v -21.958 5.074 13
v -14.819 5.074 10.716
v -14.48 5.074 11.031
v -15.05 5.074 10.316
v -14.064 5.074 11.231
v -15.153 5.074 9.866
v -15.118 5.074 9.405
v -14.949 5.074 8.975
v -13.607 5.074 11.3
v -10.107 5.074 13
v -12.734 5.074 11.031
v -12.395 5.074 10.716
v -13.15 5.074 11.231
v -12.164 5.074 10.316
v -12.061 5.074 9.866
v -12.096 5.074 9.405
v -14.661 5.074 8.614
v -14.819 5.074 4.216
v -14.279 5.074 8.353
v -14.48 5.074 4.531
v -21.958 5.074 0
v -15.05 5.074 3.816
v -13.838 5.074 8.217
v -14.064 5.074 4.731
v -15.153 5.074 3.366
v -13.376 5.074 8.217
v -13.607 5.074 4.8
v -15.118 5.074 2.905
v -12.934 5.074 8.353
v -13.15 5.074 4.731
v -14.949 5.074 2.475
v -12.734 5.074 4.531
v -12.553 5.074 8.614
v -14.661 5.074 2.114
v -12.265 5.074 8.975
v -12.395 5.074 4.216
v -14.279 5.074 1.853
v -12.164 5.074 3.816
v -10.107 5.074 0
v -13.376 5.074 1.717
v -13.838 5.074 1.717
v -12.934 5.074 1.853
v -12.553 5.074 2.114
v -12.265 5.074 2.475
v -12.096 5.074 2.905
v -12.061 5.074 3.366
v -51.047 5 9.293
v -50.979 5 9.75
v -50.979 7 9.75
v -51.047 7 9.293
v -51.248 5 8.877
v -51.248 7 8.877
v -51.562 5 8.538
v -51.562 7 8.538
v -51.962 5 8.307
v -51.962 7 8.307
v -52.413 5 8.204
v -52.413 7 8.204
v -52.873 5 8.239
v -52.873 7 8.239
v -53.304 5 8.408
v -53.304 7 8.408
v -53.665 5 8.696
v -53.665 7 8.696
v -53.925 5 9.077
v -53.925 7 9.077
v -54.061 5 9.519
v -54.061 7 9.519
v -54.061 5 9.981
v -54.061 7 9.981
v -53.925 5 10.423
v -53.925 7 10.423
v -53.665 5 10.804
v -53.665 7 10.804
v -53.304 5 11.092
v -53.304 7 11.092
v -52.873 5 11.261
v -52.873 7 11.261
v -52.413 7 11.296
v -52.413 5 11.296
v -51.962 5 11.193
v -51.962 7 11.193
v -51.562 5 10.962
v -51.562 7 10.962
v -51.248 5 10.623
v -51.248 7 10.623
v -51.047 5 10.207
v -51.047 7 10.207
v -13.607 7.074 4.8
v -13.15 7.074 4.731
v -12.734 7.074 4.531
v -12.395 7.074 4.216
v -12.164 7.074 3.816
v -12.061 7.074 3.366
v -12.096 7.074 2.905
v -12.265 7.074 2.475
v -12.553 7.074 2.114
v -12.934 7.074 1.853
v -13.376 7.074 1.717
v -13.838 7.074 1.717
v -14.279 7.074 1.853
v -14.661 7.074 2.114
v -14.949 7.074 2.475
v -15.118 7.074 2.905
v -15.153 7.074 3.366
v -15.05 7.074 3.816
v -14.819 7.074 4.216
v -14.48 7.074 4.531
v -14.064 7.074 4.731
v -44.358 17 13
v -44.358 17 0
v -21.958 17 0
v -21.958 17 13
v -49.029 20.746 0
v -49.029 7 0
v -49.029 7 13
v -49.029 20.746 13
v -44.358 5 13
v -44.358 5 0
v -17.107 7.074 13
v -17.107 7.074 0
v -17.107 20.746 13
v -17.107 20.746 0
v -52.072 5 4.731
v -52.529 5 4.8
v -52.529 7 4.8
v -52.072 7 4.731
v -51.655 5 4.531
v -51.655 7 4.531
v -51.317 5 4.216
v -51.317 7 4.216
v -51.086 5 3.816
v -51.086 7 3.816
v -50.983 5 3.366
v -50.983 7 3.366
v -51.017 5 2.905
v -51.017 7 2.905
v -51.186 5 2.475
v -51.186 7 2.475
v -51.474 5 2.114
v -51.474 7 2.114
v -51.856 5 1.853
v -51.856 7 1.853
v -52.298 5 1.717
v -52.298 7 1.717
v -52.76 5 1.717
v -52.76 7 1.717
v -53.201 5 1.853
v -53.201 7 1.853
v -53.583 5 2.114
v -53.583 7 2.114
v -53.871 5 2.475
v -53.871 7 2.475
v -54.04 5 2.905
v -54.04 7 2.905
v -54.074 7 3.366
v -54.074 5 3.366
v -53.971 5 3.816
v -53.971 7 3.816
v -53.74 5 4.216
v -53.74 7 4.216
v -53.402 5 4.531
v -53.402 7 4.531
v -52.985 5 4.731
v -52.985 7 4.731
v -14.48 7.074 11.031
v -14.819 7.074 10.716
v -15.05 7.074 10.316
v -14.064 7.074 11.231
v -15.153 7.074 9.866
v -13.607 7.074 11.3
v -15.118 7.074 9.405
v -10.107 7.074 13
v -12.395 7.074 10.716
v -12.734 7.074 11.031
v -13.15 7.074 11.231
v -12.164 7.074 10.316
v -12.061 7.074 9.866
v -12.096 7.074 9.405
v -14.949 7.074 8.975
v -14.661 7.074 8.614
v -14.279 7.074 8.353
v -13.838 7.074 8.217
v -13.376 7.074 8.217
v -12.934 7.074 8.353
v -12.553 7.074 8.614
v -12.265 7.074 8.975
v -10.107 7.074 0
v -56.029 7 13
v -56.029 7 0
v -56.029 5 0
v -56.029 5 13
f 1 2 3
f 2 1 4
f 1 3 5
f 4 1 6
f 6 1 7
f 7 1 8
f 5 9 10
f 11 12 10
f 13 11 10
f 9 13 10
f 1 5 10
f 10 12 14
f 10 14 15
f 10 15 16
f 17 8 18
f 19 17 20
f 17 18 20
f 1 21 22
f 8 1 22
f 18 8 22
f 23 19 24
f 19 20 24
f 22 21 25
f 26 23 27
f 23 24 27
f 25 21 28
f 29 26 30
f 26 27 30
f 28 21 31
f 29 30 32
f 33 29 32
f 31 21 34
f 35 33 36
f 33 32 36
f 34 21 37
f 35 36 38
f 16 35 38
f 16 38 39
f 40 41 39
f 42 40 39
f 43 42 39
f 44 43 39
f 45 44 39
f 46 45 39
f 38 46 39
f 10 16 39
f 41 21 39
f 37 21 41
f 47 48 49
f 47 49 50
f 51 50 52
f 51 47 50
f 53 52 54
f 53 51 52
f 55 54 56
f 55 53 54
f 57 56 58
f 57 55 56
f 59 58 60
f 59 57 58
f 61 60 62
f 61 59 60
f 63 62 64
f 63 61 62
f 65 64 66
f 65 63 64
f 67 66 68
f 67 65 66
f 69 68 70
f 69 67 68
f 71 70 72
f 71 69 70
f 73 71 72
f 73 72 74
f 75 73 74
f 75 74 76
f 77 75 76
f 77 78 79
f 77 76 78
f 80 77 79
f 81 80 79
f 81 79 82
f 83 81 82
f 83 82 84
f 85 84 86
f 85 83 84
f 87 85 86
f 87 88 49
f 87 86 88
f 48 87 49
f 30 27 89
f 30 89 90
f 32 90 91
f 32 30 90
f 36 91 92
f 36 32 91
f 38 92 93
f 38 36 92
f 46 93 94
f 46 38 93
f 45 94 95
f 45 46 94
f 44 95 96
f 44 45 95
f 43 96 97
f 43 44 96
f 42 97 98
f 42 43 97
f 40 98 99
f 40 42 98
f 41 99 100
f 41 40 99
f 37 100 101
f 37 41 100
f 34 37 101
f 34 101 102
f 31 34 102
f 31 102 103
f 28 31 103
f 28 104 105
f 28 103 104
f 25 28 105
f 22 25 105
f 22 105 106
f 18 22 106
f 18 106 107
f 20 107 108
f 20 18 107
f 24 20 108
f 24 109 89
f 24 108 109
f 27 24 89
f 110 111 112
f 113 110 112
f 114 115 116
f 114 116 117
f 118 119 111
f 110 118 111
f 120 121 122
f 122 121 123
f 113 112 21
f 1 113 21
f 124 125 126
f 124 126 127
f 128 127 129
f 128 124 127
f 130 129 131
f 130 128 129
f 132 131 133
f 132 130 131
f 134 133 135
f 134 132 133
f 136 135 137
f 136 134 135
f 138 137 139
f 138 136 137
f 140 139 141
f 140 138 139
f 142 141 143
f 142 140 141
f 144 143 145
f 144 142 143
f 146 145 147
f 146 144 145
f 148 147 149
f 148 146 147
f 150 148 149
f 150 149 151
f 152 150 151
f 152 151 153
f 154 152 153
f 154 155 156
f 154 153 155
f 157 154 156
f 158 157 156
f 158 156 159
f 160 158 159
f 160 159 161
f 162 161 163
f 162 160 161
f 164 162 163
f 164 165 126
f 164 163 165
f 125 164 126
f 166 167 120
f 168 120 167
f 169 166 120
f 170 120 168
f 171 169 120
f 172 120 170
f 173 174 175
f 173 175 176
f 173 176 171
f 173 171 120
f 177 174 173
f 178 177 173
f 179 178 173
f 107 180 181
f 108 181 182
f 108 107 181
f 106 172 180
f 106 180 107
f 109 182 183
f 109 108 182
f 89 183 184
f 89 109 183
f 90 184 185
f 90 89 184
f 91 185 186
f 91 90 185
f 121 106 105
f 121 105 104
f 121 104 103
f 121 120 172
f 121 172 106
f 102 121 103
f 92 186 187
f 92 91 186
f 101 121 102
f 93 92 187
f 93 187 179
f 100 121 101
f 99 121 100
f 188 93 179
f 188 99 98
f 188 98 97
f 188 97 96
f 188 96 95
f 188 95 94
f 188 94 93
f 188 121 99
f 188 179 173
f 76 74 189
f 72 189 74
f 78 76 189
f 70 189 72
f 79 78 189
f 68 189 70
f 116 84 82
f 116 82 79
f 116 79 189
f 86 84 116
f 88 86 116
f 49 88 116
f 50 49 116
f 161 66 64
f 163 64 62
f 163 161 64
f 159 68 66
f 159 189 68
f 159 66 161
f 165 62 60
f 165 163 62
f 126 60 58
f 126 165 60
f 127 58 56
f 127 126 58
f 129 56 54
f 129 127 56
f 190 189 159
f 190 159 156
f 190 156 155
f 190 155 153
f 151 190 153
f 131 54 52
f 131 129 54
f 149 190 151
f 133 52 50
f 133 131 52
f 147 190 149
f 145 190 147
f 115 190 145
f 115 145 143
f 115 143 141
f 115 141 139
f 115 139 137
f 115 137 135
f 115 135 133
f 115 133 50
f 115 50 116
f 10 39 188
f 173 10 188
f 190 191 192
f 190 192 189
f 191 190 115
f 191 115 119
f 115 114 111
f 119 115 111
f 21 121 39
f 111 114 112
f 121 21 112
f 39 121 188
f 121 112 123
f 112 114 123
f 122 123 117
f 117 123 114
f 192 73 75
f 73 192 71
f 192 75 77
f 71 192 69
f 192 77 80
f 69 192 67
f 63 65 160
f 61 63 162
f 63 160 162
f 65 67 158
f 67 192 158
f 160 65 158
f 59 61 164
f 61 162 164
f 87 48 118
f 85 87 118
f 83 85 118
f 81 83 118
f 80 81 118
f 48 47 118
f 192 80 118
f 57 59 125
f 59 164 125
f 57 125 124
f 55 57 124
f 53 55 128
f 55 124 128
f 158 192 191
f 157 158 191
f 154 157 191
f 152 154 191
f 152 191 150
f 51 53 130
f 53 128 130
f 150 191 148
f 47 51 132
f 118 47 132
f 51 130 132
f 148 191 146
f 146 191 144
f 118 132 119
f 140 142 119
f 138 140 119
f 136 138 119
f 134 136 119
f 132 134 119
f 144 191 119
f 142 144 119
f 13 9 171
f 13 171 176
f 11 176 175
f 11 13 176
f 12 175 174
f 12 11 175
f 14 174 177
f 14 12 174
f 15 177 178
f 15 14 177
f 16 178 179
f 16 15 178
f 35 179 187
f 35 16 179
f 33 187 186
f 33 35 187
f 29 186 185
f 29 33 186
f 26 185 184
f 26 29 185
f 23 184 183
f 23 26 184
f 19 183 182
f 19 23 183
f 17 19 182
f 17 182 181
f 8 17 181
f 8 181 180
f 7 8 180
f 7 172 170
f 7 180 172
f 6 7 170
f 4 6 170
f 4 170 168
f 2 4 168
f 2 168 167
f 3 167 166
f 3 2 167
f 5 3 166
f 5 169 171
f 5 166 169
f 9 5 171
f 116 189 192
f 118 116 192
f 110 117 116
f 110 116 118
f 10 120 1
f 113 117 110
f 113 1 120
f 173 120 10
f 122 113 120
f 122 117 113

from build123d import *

# Parameters (mm, degrees)
SKETCH1_W               = 4.671
SKETCH1_H               = 15.746
SKETCH1_W_2             = 7
SKETCH1_H_2             = 2
SKETCH1_W_3             = 22.4
SKETCH1_H_3             = 3.746
BOSS_EXTRUDE1_DEPTH     = 13
CUT_EXTRUDE1_DEPTH      = 60.119451433
CUT_EXTRUDE1_DEPTH_BACK = 60.119451433
SKETCH2_R               = 1.55


with BuildPart() as part:
    # Sketch1 → Boss-Extrude1 (new body)
    with BuildSketch(Plane.XY):
        with Locations((-46.693035151, 12.873)):
            Rectangle(SKETCH1_W, SKETCH1_H)
        with Locations((-52.528535151, 6)):
            Rectangle(SKETCH1_W_2, SKETCH1_H_2)
        with Locations((-33.157535151, 18.873)):
            Rectangle(SKETCH1_W_3, SKETCH1_H_3)
        Polygon((-21.957535151, 20.746), (-21.957535151, 17), (-21.957535151, 5.074394878), (-17.106930028, 5.074394878), (-17.106930028, 7.074394878), (-17.106930028, 20.746), align=None)
        with Locations((-13.606930028, 6.074394878)):
            Rectangle(SKETCH1_W_2, SKETCH1_H_2)
    extrude(amount=BOSS_EXTRUDE1_DEPTH)

    # Sketch2 → Cut-Extrude1 (cut, two sides: drawn at the far end of the back side and taken through both)
    with BuildSketch(Plane(origin=(0, 7.074394878, 0), x_dir=(1, 0, 0), z_dir=(0, 1, 0)).offset(-CUT_EXTRUDE1_DEPTH_BACK)):
        with Locations(Location((-13.606930028, -9.75, 0), (0, 0, 270))):
            Circle(SKETCH2_R)
        with Locations(Location((-13.606930028, -3.25, 0), (0, 0, 270))):
            Circle(SKETCH2_R)
        with Locations(Location((-52.528535151, -3.25, 0), (0, 0, 270))):
            Circle(SKETCH2_R)
        with Locations((-52.528535151, -9.75)):
            Circle(SKETCH2_R)
    extrude(amount=CUT_EXTRUDE1_DEPTH + CUT_EXTRUDE1_DEPTH_BACK, mode=Mode.SUBTRACT)


solid = part.part
